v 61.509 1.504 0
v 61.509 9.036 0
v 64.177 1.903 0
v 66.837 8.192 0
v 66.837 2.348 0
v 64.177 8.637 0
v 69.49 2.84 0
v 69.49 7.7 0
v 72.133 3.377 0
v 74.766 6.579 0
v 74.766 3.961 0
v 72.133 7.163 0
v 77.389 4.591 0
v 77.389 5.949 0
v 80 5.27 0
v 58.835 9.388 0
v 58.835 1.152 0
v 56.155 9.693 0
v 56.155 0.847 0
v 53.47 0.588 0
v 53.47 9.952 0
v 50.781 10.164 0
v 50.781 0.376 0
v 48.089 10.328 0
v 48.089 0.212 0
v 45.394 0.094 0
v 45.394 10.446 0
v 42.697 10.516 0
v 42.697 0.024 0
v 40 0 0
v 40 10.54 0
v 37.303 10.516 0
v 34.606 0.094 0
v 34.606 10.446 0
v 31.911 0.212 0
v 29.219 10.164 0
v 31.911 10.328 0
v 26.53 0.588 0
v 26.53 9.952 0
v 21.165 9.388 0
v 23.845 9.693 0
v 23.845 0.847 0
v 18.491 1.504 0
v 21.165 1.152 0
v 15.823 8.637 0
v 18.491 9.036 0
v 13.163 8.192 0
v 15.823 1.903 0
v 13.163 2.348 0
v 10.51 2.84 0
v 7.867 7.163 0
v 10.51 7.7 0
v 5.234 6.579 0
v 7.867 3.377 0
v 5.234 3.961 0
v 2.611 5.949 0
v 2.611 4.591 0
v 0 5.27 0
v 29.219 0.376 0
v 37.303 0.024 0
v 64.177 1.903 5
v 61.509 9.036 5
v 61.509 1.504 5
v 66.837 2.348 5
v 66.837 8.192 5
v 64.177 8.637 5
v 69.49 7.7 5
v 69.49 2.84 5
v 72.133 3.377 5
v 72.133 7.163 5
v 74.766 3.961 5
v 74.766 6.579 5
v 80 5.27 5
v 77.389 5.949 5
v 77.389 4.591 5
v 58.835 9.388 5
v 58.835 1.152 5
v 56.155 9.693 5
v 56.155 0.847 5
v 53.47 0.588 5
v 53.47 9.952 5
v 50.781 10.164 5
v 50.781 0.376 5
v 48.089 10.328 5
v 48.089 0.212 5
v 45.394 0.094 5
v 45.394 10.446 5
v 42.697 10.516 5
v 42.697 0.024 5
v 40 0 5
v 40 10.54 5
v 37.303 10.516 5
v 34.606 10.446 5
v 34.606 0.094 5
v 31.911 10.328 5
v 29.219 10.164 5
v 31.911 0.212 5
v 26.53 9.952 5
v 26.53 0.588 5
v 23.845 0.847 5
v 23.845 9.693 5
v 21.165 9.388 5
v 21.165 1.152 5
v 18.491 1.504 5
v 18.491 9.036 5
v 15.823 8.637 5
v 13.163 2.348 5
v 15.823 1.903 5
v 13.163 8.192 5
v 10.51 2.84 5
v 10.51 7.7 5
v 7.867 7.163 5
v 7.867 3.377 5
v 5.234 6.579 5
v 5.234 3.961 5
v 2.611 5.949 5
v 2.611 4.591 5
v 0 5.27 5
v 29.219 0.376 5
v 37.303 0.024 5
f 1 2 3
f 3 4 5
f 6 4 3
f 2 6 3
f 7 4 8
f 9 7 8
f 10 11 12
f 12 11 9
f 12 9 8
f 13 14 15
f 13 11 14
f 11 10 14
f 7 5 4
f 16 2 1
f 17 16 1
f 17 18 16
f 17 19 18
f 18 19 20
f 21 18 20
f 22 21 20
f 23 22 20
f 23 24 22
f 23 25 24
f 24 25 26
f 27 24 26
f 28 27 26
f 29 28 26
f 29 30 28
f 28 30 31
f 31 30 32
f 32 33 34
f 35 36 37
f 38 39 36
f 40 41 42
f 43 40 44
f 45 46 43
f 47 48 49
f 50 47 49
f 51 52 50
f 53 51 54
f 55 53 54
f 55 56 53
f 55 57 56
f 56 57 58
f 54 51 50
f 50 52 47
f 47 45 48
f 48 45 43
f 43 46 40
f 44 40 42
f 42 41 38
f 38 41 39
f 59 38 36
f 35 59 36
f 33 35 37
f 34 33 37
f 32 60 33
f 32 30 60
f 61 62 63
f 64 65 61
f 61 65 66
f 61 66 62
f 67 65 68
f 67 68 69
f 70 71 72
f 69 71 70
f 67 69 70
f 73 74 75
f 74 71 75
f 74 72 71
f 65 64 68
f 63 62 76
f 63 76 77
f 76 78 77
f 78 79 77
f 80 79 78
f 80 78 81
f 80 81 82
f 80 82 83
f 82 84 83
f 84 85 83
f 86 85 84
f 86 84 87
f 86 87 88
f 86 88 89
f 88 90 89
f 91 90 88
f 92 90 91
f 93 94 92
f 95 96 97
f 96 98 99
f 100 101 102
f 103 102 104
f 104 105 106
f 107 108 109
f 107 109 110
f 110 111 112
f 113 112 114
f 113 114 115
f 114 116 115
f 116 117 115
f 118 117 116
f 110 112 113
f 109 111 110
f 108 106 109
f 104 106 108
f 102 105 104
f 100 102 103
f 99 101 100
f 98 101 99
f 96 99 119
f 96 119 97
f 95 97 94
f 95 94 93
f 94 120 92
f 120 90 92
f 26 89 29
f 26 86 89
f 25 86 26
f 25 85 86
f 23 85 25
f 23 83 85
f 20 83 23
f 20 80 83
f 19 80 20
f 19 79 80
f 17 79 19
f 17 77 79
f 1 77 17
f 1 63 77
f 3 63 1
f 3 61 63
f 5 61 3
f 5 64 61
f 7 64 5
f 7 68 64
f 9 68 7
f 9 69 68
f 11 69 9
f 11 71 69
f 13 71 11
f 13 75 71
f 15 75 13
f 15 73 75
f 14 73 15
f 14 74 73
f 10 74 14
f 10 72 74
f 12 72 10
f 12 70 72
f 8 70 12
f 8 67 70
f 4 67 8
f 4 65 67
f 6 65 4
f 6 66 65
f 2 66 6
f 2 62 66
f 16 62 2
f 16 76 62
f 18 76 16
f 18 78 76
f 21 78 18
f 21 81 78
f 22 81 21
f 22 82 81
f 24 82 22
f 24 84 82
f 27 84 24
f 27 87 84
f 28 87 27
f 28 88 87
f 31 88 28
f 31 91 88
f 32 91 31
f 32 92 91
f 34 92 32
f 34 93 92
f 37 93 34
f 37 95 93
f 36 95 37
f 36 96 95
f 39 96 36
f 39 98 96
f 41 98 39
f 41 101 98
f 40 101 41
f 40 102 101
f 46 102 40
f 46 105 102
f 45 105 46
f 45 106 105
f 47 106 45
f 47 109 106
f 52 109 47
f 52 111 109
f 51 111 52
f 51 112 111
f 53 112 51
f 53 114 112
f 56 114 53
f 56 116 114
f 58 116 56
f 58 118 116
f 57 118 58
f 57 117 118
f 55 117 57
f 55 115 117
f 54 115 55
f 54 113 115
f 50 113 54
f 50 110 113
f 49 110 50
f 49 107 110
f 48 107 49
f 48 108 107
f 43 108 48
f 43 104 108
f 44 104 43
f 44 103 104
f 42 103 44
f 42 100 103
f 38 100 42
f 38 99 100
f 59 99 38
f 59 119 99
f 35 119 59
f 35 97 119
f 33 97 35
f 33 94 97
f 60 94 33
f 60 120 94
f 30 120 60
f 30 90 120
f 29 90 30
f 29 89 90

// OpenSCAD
$fn = 32;

// ----------------------------------------------------------------------
// Arc profile plate: lens, 60 points
// ----------------------------------------------------------------------

// --- parameters (mm) ---
lens_chord = 80;          // chord length of the lens, X
arc_r = 154.55;           // radius of both arcs
arc_angle = 30;           // angle of each arc, degrees
sagitta = 5.27;           // bulge of each arc (half the lens height)
arc_step = 1;             // sampling step of the arcs, degrees
plate_t = 5;              // plate thickness, Z
fit_tol = 0.1;            // declared fit tolerance (prompt contract)
free_tol = 0.5;           // declared free tolerance (prompt contract)

bbox_y = 2 * sagitta;  // full lens height

profile = [[80, 5.27], [77.389, 5.949], [74.766, 6.579], [72.133, 7.163], [69.49, 7.7], [66.837, 8.192], [64.177, 8.637], [61.509, 9.036], [58.835, 9.388], [56.155, 9.693], [53.47, 9.952], [50.781, 10.164], [48.089, 10.328], [45.394, 10.446], [42.697, 10.516], [40, 10.54], [37.303, 10.516], [34.606, 10.446], [31.911, 10.328], [29.219, 10.164], [26.53, 9.952], [23.845, 9.693], [21.165, 9.388], [18.491, 9.036], [15.823, 8.637], [13.163, 8.192], [10.51, 7.7], [7.867, 7.163], [5.234, 6.579], [2.611, 5.949], [0, 5.27], [2.611, 4.591], [5.234, 3.961], [7.867, 3.377], [10.51, 2.84], [13.163, 2.348], [15.823, 1.903], [18.491, 1.504], [21.165, 1.152], [23.845, 0.847], [26.53, 0.588], [29.219, 0.376], [31.911, 0.212], [34.606, 0.094], [37.303, 0.024], [40, 0], [42.697, 0.024], [45.394, 0.094], [48.089, 0.212], [50.781, 0.376], [53.47, 0.588], [56.155, 0.847], [58.835, 1.152], [61.509, 1.504], [64.177, 1.903], [66.837, 2.348], [69.49, 2.84], [72.133, 3.377], [74.766, 3.961], [77.389, 4.591]];  // primary outline, 60 points, counter clockwise

// --- the one profile operation ---
linear_extrude(height = plate_t) polygon(points = profile);
